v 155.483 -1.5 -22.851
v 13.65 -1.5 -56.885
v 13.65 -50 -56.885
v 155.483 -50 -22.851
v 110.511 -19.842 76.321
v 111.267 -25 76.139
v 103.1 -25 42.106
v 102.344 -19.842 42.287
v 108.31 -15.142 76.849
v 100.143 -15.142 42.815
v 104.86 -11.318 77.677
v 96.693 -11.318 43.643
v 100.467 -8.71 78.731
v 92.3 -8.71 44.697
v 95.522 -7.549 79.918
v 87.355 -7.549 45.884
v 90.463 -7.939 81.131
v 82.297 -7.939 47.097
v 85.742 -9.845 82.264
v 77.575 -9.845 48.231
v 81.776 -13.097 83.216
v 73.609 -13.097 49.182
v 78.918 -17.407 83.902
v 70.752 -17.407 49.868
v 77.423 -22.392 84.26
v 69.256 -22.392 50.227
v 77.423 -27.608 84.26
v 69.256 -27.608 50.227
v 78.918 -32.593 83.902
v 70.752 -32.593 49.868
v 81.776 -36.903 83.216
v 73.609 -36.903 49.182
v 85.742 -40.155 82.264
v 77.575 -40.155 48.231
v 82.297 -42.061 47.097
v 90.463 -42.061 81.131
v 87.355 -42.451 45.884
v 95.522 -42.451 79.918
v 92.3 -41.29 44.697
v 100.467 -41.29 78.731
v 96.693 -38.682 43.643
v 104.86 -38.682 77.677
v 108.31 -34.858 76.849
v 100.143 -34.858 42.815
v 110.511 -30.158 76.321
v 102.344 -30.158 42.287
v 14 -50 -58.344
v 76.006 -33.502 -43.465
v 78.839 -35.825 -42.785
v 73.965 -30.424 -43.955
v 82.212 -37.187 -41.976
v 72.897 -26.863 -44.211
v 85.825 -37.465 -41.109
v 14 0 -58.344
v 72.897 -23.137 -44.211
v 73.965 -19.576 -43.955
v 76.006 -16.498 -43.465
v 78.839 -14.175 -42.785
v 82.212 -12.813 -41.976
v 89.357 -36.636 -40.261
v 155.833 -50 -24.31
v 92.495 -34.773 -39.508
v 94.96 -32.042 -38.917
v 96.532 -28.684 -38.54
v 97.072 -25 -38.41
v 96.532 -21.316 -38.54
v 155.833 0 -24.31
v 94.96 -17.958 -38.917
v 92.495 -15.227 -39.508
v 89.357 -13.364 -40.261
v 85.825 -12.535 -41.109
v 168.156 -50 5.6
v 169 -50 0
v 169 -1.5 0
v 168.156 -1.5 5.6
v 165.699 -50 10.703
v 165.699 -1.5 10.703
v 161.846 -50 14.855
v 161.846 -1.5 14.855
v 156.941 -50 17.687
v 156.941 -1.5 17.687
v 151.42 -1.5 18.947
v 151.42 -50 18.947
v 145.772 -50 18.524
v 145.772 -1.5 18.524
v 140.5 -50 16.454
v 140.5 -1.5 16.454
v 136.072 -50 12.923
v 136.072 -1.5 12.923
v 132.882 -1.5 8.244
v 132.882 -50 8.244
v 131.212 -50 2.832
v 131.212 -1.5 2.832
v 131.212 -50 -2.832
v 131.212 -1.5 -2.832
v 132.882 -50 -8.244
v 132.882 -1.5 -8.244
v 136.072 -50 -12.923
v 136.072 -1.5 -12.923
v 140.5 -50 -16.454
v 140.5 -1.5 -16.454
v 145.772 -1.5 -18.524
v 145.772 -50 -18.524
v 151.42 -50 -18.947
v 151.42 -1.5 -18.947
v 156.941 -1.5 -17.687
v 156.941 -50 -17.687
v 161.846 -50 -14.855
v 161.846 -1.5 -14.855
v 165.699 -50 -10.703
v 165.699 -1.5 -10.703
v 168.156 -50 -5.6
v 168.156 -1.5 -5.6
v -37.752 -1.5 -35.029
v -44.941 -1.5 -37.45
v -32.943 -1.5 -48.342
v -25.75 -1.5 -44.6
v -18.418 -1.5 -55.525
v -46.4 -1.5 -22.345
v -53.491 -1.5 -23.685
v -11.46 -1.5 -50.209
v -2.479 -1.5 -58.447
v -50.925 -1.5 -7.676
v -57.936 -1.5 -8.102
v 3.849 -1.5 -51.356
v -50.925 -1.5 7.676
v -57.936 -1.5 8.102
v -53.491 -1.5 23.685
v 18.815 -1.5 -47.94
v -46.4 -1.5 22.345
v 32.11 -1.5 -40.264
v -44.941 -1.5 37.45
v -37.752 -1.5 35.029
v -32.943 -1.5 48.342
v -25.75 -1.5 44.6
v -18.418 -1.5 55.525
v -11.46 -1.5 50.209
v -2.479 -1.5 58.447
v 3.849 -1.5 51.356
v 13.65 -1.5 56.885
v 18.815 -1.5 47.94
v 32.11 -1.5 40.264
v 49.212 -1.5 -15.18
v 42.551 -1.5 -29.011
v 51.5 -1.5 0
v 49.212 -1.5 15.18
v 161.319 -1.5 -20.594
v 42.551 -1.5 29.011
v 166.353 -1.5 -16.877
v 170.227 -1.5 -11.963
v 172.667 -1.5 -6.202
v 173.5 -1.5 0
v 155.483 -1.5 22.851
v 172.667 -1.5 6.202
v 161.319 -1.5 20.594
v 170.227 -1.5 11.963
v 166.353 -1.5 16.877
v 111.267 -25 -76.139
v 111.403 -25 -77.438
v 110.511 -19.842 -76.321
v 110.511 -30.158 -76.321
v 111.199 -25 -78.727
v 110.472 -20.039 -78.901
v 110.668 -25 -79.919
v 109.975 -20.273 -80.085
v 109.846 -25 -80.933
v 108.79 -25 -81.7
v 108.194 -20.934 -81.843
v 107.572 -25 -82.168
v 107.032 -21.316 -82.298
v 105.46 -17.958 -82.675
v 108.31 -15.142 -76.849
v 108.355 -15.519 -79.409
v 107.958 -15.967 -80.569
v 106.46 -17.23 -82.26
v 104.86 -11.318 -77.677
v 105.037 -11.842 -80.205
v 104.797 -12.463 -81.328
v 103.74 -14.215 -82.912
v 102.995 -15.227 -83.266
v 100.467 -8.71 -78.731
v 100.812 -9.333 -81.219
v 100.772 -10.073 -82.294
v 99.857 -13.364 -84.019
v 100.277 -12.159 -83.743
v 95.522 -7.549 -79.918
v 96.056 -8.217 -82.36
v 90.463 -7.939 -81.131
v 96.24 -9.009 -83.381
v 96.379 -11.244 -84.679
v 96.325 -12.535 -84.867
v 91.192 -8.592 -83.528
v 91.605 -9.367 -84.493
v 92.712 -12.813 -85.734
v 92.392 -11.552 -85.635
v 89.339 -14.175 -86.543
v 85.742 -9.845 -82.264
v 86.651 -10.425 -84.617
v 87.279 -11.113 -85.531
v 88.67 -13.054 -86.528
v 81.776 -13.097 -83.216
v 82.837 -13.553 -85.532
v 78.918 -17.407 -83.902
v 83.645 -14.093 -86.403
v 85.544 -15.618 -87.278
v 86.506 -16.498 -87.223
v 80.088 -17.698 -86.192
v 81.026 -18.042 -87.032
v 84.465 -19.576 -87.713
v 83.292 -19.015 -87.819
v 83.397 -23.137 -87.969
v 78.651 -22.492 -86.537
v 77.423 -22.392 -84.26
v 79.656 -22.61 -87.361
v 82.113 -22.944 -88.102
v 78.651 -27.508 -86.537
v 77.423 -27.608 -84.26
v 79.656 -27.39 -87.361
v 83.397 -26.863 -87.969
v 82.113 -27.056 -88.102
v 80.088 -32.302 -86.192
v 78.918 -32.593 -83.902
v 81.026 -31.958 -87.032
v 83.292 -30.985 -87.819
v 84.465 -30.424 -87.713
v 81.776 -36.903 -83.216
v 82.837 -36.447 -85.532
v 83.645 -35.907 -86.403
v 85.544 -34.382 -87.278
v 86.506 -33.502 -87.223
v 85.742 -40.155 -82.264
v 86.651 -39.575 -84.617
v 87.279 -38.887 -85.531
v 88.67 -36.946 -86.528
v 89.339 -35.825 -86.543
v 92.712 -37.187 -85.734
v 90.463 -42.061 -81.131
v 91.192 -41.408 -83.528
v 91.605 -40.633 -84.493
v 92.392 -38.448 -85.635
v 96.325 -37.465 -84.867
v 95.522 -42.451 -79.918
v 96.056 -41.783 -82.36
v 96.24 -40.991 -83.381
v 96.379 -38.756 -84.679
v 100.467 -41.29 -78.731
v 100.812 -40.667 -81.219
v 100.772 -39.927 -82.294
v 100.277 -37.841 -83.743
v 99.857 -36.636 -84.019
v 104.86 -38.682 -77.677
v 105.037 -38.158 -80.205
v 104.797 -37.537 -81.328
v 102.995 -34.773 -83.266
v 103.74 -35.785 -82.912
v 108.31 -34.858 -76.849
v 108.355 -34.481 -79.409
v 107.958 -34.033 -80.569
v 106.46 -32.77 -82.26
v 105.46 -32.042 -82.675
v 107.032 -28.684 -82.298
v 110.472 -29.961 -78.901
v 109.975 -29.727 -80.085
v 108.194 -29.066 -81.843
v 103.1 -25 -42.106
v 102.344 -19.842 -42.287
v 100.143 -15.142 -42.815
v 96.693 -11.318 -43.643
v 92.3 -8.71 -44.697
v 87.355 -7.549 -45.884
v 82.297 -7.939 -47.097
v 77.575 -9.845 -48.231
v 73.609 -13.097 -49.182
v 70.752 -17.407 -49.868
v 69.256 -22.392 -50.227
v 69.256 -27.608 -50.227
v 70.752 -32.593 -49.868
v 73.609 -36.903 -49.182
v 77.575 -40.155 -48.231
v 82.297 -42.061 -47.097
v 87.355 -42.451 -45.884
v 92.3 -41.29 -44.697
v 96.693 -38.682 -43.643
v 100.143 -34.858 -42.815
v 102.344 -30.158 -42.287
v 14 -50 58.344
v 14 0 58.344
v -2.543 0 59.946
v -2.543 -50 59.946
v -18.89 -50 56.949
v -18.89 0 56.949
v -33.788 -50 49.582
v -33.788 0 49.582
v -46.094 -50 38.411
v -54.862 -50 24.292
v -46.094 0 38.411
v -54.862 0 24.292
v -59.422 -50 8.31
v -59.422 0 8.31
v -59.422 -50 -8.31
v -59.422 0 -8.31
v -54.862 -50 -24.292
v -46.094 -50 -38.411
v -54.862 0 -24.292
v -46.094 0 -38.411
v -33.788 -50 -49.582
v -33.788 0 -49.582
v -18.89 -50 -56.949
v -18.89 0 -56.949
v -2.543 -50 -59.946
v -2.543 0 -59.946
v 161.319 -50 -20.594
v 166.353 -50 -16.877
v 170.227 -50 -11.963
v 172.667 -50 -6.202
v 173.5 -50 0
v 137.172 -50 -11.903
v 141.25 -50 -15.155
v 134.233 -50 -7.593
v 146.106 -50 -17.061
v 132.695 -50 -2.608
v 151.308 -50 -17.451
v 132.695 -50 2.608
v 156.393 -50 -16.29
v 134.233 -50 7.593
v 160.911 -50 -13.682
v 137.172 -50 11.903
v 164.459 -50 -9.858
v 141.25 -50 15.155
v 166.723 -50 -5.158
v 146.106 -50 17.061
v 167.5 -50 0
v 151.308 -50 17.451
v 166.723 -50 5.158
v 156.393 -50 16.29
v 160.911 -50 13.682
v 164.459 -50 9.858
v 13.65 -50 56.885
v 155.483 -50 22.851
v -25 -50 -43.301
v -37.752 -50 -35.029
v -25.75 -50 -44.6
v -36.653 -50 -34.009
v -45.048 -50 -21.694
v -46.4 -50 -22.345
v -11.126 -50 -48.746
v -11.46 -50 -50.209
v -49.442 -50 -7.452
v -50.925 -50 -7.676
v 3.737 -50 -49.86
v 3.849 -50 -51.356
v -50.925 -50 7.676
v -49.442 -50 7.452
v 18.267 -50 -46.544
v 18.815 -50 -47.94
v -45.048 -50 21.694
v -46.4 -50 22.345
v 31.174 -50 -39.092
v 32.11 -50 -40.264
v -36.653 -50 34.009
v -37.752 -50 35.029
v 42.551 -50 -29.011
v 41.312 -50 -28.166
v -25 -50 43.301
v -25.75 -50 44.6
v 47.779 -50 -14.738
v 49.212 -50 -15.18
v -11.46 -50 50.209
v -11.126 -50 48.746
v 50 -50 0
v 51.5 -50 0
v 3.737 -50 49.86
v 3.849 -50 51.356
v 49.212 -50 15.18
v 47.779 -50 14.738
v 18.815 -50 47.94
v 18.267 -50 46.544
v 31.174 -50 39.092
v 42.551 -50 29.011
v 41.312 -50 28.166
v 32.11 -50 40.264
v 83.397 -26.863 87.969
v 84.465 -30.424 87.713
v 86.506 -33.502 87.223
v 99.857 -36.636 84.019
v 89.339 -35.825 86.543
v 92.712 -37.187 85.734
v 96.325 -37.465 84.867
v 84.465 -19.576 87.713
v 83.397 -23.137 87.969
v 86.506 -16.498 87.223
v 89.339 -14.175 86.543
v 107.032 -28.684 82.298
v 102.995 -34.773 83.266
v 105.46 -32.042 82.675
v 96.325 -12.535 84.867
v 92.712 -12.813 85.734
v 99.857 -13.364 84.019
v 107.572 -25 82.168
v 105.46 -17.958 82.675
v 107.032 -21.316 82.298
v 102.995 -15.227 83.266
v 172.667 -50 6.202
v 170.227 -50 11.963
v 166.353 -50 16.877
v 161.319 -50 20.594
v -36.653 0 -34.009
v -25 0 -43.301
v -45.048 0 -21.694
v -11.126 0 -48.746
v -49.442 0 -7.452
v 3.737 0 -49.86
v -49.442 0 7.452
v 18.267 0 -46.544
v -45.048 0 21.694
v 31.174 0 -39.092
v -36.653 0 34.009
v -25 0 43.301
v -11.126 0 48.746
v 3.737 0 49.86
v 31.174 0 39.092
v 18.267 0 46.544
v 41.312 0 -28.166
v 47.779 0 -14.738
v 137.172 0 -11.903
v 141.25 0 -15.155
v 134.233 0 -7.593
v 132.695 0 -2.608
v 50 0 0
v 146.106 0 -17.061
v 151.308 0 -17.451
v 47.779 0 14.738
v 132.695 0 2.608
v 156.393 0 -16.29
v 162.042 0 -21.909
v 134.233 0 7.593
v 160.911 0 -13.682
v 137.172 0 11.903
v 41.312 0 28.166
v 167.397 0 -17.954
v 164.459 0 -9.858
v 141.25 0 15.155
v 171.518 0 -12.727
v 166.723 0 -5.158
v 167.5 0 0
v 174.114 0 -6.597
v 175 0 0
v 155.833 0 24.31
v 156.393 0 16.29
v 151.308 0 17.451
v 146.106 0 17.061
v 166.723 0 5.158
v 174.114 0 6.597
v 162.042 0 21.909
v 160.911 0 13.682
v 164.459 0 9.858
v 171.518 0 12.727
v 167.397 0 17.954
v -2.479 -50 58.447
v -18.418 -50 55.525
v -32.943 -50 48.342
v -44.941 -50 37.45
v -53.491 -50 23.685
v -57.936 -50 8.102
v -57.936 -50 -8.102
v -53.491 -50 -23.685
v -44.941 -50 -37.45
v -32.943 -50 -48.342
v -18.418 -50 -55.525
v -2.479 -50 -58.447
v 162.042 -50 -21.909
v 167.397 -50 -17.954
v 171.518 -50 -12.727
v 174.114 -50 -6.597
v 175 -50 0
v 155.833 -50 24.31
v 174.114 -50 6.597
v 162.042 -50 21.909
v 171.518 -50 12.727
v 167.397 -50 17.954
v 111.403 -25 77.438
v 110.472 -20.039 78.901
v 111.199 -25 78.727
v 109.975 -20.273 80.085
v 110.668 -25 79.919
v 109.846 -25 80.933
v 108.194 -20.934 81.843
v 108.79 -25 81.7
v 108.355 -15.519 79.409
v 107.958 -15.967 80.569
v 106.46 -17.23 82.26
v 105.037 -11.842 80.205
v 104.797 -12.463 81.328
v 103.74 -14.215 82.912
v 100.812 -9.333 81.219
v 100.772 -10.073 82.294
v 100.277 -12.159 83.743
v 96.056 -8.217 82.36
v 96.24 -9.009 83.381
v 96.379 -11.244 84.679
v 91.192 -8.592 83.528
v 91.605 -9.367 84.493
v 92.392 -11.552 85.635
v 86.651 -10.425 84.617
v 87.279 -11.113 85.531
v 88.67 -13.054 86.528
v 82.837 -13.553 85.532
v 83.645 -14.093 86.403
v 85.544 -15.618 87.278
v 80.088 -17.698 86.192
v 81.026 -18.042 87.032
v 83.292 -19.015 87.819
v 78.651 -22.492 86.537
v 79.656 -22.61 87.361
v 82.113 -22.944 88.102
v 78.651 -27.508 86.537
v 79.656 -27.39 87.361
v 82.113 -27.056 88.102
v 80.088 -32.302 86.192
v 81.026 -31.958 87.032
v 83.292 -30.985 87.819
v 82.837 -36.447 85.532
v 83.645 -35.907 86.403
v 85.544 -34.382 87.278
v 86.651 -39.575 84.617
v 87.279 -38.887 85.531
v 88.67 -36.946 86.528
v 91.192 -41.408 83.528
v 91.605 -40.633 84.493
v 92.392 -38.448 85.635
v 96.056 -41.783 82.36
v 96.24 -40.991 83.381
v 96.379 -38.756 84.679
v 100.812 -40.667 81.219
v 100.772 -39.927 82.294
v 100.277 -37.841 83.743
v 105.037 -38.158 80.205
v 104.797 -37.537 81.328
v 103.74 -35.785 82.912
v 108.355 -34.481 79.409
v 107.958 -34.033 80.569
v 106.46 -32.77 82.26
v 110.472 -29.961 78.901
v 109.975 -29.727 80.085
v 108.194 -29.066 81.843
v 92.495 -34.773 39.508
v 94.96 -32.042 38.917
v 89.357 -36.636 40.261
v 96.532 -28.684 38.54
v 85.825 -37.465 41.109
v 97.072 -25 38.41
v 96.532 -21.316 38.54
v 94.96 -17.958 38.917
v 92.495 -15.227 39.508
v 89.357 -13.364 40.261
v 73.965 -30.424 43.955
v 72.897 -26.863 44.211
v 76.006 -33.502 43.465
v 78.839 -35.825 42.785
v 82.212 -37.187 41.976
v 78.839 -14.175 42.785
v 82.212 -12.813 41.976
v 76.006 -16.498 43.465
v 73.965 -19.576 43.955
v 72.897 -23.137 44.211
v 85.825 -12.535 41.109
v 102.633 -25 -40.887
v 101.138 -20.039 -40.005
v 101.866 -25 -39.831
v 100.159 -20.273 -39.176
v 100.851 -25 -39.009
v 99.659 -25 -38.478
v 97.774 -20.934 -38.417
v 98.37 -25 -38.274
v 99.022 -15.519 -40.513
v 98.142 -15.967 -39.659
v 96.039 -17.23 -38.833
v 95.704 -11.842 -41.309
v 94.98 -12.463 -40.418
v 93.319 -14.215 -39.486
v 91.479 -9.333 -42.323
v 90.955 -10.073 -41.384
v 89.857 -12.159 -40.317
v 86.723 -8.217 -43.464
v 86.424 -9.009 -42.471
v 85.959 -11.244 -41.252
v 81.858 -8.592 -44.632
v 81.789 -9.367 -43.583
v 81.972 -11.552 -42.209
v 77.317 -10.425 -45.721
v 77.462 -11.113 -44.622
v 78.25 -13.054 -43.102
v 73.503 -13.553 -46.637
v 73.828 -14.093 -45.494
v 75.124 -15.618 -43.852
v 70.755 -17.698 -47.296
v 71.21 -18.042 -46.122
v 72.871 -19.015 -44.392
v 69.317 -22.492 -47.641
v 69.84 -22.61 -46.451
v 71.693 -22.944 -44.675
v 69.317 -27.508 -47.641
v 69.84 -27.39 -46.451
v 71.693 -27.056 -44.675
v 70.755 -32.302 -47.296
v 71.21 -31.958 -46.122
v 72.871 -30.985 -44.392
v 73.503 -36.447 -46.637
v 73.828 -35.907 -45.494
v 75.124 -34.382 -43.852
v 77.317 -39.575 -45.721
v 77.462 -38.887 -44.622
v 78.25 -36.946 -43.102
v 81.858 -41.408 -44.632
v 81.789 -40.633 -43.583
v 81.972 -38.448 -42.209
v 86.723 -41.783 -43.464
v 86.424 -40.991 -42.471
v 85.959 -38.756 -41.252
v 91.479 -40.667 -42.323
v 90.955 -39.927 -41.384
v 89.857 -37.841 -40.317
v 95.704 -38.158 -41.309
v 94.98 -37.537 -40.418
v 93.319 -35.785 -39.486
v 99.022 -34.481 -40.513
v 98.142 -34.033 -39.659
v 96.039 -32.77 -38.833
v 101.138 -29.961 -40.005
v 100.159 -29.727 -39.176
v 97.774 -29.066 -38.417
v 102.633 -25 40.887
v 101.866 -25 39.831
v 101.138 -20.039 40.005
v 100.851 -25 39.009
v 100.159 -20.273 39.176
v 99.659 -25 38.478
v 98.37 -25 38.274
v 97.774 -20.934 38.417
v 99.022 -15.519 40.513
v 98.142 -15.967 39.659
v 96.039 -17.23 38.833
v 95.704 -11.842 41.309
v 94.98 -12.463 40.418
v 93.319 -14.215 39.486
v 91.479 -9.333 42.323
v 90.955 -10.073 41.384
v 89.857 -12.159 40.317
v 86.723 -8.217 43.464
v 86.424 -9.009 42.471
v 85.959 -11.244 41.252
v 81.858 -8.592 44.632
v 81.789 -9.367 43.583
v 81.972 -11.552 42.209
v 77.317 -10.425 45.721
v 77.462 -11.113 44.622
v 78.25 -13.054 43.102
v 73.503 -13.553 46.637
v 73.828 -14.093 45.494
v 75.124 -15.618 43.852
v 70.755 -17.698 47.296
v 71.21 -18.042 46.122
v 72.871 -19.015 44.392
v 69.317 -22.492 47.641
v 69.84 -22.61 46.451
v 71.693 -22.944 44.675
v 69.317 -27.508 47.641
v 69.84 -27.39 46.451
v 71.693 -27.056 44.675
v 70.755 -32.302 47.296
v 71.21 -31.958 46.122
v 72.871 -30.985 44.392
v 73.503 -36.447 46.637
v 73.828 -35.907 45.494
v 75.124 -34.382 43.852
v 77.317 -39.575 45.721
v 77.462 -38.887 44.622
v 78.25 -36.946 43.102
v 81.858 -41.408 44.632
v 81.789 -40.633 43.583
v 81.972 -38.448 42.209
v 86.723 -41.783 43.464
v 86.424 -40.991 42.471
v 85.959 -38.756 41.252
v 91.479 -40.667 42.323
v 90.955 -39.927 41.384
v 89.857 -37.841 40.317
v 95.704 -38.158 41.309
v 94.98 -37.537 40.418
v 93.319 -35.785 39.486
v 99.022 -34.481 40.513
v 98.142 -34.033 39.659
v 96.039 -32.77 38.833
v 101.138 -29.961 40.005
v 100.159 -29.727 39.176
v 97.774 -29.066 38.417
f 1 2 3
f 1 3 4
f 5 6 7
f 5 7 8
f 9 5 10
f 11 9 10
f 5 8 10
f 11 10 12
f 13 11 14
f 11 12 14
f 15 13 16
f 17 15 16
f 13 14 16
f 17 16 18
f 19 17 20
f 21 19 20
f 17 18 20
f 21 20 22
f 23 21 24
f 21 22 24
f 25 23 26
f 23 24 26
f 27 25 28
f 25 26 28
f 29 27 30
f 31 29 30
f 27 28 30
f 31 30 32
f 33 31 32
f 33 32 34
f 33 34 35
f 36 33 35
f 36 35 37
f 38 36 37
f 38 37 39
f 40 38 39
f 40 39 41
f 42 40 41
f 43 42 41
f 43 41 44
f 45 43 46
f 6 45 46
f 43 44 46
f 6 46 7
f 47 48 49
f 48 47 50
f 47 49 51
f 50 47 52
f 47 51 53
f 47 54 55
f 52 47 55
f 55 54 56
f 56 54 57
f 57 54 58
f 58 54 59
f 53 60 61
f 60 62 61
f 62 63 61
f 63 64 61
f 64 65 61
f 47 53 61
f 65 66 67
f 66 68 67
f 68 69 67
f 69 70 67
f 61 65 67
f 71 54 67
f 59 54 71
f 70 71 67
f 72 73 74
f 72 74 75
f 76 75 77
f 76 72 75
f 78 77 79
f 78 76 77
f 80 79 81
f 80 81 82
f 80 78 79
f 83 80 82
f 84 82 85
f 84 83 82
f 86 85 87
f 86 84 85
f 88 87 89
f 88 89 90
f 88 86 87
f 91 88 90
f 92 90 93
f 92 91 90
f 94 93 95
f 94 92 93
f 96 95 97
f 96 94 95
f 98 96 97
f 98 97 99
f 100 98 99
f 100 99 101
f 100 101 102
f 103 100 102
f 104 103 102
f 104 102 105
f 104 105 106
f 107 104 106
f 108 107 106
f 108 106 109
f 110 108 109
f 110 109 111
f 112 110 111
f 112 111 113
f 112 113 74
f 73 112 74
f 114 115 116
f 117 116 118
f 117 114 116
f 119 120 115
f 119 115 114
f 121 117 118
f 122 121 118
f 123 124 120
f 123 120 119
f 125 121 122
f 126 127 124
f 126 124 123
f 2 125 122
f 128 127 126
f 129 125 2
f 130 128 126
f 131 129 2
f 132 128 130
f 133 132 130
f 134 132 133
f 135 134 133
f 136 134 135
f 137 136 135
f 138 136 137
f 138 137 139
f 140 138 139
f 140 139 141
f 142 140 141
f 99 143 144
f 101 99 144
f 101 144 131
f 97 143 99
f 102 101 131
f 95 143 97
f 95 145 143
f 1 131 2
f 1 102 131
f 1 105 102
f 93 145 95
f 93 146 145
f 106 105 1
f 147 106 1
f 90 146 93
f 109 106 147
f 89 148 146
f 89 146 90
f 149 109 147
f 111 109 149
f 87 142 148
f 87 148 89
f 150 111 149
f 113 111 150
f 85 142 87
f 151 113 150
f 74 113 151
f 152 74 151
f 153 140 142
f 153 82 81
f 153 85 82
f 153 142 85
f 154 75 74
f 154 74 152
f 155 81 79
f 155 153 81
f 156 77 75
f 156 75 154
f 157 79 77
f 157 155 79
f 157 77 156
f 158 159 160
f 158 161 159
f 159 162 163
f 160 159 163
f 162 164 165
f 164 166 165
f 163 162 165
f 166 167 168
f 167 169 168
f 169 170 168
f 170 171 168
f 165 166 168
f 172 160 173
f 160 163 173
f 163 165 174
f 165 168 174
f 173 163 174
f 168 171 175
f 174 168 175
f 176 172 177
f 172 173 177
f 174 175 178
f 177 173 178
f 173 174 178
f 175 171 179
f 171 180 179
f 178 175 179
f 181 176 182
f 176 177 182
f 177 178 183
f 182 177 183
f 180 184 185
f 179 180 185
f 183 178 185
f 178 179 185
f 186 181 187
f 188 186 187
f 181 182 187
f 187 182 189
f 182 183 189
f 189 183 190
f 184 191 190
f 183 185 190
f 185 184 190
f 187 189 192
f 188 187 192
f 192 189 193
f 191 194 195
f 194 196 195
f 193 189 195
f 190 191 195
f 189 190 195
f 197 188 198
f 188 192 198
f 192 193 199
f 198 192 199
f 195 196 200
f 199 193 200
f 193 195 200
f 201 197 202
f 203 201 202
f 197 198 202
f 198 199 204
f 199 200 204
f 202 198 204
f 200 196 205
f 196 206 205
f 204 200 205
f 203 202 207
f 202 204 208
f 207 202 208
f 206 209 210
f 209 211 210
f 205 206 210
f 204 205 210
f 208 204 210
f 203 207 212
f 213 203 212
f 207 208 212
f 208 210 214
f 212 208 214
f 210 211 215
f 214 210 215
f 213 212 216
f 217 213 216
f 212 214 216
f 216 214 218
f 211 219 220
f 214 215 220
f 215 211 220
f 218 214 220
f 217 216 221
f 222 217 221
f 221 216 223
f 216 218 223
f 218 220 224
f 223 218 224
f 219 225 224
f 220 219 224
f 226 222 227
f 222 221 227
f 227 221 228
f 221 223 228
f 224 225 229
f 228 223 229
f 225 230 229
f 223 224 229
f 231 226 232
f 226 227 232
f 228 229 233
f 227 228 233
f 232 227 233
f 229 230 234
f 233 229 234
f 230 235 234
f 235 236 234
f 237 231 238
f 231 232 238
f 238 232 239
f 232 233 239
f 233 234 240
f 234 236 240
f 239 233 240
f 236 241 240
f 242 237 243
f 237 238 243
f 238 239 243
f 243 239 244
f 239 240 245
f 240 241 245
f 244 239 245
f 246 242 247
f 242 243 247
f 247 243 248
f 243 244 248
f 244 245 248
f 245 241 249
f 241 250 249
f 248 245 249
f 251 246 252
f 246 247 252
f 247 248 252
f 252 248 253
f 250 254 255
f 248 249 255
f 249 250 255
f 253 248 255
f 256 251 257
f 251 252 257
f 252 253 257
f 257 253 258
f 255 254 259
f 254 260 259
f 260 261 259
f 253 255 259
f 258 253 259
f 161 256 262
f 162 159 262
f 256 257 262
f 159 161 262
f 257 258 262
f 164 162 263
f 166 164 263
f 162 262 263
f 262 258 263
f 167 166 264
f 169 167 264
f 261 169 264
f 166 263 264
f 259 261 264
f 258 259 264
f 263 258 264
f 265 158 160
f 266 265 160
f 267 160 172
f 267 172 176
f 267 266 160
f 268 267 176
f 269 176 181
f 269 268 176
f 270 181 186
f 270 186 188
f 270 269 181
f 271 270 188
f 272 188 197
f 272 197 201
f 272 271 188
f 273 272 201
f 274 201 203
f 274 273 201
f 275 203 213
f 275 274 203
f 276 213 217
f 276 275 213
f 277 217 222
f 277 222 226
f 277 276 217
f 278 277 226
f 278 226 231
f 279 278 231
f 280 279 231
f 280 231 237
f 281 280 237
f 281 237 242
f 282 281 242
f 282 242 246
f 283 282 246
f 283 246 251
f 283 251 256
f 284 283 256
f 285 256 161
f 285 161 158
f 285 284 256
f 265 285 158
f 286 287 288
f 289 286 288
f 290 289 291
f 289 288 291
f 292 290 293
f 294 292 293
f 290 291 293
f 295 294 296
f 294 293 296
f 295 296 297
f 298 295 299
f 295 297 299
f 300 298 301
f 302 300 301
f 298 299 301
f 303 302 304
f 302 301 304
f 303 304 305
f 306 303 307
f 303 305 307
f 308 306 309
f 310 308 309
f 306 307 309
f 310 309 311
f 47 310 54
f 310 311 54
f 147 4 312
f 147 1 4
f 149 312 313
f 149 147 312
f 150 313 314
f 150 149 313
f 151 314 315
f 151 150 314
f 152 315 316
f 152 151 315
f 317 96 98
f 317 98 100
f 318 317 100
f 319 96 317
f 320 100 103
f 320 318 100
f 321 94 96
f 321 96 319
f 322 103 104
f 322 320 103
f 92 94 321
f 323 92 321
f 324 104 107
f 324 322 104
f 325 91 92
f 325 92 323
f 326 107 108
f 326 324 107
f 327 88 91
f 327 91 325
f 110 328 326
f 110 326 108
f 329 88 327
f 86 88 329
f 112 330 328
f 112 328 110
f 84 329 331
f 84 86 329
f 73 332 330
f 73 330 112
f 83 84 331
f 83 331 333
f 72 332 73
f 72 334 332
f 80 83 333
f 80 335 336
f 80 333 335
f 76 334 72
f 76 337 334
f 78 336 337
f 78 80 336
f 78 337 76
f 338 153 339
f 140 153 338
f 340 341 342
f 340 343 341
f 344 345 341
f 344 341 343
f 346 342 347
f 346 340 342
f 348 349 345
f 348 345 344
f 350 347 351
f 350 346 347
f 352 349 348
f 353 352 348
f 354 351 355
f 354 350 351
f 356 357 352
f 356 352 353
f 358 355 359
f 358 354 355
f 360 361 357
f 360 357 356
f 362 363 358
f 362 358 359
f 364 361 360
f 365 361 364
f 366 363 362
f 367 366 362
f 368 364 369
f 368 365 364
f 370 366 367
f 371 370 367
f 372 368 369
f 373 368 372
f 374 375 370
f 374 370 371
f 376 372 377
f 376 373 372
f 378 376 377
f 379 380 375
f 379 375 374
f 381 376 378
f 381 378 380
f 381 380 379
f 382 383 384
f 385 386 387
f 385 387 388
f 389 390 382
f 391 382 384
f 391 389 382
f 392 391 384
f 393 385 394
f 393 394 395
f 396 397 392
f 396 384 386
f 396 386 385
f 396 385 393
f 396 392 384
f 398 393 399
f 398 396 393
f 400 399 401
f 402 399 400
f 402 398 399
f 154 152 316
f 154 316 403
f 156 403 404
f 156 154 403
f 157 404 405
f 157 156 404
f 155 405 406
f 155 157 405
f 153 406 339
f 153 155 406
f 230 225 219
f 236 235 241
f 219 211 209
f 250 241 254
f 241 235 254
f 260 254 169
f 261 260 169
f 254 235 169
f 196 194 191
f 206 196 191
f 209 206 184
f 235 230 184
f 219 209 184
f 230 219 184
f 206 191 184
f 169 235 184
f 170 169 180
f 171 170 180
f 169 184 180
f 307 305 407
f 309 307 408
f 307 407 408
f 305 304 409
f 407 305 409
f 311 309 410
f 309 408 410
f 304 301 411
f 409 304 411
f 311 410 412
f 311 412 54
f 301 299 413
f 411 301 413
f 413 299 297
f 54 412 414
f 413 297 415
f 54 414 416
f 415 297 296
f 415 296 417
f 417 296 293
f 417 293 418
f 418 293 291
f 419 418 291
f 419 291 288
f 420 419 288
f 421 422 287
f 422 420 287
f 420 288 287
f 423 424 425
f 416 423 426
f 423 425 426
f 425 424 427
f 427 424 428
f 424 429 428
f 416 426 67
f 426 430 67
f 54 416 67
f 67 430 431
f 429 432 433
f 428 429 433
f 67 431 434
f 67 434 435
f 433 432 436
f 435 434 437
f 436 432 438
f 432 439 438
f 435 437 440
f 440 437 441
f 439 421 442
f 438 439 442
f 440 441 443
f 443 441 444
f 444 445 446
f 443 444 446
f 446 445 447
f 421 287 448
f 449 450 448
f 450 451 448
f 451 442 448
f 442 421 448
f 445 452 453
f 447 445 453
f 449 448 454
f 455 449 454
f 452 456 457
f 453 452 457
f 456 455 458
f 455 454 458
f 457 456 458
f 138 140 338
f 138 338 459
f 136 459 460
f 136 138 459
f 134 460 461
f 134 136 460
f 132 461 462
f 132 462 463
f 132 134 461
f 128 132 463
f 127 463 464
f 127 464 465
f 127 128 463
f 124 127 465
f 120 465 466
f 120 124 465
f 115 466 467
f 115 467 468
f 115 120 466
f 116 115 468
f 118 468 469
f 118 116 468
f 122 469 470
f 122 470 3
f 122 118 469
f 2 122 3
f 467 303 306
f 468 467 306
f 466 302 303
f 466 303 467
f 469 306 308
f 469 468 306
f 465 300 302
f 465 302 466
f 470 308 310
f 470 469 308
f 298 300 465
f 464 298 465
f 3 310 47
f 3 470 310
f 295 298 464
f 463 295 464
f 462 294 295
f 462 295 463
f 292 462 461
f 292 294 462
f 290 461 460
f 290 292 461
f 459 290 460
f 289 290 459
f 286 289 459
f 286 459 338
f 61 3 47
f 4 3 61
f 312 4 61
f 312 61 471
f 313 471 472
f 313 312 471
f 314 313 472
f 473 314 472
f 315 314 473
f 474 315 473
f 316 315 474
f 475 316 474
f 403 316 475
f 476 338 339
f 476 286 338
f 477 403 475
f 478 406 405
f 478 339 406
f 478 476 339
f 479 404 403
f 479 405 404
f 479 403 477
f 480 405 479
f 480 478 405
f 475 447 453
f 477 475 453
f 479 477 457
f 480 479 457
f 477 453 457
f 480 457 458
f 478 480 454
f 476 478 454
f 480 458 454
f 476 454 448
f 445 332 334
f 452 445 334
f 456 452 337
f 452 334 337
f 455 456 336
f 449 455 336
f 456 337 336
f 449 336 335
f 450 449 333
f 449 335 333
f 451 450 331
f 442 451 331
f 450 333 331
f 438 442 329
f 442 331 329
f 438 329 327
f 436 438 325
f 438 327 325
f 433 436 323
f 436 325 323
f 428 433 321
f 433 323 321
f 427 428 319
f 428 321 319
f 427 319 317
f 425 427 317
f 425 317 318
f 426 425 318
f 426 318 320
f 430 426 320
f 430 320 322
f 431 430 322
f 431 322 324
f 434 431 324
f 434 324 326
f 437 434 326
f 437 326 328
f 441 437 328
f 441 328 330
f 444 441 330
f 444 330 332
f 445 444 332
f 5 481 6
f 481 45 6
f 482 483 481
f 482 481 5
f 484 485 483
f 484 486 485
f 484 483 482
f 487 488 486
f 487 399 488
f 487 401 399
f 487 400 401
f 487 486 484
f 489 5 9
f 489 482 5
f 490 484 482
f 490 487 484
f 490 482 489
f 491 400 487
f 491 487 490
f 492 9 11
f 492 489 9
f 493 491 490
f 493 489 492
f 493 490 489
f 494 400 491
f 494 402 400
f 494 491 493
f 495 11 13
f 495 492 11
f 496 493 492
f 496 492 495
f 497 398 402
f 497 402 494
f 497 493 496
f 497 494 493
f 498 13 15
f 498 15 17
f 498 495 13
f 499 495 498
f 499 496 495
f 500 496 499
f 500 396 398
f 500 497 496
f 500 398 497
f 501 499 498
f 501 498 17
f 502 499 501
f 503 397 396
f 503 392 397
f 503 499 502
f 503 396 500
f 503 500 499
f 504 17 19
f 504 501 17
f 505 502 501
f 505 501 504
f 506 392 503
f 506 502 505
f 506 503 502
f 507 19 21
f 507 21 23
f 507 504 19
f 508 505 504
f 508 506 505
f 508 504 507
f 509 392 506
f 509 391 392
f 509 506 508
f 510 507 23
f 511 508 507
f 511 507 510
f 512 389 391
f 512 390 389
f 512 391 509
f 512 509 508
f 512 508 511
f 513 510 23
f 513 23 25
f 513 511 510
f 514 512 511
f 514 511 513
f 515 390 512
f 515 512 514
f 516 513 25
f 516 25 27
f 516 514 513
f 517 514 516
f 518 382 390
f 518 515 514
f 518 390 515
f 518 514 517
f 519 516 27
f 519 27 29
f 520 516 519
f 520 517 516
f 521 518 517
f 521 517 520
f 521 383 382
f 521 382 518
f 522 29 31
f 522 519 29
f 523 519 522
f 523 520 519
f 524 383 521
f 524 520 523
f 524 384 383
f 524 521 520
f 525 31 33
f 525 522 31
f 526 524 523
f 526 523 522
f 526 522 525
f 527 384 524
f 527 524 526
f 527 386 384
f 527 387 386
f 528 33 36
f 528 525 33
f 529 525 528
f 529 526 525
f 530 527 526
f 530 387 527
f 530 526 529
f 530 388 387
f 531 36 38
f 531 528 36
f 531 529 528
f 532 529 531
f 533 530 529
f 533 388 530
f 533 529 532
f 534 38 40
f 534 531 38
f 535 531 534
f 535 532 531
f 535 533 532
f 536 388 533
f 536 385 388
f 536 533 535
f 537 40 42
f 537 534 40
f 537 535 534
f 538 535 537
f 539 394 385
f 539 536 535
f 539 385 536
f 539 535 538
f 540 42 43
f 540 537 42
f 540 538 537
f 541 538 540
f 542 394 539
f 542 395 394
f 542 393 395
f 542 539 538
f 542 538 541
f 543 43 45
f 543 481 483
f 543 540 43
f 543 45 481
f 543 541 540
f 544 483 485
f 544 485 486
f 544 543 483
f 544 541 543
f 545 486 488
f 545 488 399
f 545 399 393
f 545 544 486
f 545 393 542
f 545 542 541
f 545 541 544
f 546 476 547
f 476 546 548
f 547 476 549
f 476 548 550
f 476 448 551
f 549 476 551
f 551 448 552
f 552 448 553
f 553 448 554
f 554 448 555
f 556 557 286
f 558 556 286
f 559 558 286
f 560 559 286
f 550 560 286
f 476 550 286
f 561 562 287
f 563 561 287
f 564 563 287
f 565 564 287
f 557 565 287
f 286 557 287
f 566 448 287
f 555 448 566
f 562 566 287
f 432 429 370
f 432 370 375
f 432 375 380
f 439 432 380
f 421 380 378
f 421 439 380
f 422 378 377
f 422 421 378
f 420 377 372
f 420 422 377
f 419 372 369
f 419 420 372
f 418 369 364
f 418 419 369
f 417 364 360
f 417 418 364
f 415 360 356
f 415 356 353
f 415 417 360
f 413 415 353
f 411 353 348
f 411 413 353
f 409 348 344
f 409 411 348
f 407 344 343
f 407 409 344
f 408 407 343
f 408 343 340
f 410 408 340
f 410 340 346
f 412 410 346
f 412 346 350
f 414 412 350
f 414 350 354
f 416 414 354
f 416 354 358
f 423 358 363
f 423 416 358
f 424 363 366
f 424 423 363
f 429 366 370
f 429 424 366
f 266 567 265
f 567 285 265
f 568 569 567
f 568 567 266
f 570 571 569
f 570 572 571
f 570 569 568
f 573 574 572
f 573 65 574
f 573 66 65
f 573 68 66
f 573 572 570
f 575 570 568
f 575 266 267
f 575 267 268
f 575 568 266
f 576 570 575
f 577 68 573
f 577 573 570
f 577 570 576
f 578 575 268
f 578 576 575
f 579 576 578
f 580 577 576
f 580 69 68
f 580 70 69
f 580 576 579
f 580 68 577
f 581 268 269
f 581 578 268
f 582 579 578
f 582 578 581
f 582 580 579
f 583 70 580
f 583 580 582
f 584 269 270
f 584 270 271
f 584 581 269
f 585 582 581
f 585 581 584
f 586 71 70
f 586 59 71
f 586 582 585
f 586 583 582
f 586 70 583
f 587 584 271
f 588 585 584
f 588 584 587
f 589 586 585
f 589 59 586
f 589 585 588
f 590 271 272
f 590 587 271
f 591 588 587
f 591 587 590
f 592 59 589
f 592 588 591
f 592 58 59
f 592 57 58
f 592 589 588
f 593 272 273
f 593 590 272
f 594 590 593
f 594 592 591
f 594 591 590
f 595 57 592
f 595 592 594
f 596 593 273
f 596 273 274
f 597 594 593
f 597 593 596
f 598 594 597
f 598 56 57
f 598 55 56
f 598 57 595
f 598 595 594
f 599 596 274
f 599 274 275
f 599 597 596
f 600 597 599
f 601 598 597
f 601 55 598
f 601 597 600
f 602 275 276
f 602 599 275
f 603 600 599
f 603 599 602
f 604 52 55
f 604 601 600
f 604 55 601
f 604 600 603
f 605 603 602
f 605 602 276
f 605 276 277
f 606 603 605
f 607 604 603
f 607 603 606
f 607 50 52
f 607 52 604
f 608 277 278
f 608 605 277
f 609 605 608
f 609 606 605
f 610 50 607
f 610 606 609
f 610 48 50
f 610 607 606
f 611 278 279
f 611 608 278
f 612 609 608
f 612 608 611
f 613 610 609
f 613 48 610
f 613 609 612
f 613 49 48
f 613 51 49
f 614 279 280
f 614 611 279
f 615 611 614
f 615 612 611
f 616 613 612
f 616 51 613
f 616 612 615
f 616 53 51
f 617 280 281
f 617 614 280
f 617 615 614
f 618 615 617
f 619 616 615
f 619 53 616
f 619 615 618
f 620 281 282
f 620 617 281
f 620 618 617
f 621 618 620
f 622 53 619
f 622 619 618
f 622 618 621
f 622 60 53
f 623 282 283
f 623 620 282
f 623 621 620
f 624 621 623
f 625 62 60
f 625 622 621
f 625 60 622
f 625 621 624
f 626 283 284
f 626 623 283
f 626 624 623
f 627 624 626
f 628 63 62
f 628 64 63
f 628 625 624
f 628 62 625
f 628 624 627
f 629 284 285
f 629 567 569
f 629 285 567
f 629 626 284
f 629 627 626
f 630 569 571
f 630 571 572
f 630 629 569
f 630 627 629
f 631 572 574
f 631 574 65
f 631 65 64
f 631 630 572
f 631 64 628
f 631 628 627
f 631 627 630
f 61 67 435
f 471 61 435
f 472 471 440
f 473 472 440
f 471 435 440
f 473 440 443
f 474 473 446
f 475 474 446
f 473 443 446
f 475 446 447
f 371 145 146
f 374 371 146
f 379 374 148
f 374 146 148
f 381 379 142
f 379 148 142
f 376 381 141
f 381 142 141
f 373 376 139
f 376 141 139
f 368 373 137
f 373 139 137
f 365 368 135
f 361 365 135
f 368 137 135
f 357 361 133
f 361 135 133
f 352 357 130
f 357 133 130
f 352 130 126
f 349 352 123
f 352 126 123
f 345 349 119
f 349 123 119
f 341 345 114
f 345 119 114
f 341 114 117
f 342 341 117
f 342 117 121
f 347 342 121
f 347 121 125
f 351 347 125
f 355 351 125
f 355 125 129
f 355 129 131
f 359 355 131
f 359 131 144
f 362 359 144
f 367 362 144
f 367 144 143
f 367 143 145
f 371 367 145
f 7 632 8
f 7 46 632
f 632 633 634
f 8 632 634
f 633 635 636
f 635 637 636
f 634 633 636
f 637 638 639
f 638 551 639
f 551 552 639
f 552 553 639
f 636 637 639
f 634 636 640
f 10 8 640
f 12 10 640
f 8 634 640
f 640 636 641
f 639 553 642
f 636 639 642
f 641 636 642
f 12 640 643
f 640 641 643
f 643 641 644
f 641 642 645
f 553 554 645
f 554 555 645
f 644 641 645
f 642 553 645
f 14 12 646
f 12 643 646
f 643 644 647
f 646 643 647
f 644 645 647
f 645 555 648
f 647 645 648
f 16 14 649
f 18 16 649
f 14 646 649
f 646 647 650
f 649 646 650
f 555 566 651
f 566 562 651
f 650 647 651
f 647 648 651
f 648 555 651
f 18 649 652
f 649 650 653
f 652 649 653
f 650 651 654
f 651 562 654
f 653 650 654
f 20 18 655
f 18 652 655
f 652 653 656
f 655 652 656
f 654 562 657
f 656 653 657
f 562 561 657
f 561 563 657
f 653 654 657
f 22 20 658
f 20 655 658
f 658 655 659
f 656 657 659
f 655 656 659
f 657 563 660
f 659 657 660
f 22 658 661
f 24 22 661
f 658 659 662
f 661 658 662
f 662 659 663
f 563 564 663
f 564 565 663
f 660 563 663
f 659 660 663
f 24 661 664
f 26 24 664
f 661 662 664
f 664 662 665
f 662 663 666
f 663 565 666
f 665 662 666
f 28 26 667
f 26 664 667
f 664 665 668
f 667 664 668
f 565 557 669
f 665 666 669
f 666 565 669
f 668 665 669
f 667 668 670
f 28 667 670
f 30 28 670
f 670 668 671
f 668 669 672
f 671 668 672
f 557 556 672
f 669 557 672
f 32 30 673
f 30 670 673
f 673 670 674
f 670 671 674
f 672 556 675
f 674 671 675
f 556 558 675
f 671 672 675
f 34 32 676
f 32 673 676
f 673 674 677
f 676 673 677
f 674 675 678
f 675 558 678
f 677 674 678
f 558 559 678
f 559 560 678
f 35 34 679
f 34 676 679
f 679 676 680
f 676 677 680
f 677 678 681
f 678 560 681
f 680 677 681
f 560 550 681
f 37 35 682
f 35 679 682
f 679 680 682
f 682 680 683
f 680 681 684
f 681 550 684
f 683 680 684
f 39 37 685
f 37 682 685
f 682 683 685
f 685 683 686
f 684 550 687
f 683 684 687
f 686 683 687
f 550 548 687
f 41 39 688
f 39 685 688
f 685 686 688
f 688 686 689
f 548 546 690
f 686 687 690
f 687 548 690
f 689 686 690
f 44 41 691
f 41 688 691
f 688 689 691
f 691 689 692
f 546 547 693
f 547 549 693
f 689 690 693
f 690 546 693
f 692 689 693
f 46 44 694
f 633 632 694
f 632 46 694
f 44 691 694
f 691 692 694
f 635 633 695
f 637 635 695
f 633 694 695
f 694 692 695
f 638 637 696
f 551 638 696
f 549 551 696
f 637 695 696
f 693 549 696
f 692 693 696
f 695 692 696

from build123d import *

# Parameters (mm, degrees)
F0_R     = 50
F1_DEPTH = 50
F2_R     = 17.5
F3_DEPTH = 45
F4_R     = 5
F5_R     = 17.5
F6_DEPTH = 50.001
F7_T     = -1.5


with BuildPart() as f1:
    # F0 (on Front) → F1 (new body)
    with BuildSketch(Plane.XZ):
        with BuildLine():
            ThreePointArc((14, -58.3438085833), (47.1168759576, -37.148351242), (60, 0))
            ThreePointArc((60, 0), (47.1168759576, 37.148351242), (14, 58.3438085833))
            ThreePointArc((14, 58.3438085833), (-60, 0), (14, -58.3438085833))
        make_face()
        Circle(F0_R, mode=Mode.SUBTRACT)
        with BuildLine():
            ThreePointArc((14, 58.3438085833), (47.1168759576, 37.148351242), (60, 0))
            ThreePointArc((60, 0), (47.1168759576, -37.148351242), (14, -58.3438085833))
            Line((14, -58.3438085833), (155.8333333333, -24.309920243))
            ThreePointArc((155.8333333333, -24.309920243), (125, 0), (155.8333333333, 24.309920243))
            Line((155.8333333333, 24.309920243), (14, 58.3438085833))
        make_face()
        with BuildLine():
            ThreePointArc((175, 0), (169.632031649, 15.4784796842), (155.8333333333, 24.309920243))
            ThreePointArc((155.8333333333, 24.309920243), (125, 0), (155.8333333333, -24.309920243))
            ThreePointArc((155.8333333333, -24.309920243), (169.632031649, -15.4784796842), (175, 0))
        make_face()
    extrude(amount=F1_DEPTH)

    # F5 (on face) → F6 (cut, through all)
    with BuildSketch(Plane.XZ.offset(50)):
        with Locations((150, 0)):
            Circle(F5_R)
    extrude(amount=-F6_DEPTH, mode=Mode.SUBTRACT)

    # F7
    f7_openings = [f1.faces().sort_by_distance(p)[0] for p in [
        (65.769085, -50, 0),
    ]]
    offset(amount=F7_T, openings=f7_openings)



with BuildPart() as f3:
    # F2 (on face) → F3 (new body)
    with BuildSketch(Plane(origin=(14, 0, 58.3438085833), x_dir=(0.9723968097, 0, -0.2333333333), z_dir=(0.2333333333, 0, 0.9723968097))):
        with Locations((72.9297607291, -25)):
            Circle(F2_R)
    extrude(amount=F3_DEPTH)

    # F4
    f4_edges = [f3.edges().sort_by_distance(p)[0] for p in [
        (78.399722, -25, 89.168054),
        (67.899722, -25, 45.410198),
    ]]
    fillet(f4_edges, radius=F4_R)


with BuildPart() as f1_1:
    add(f1.part)

    add(f3.part)  # F8 merges F3
    # F8: F3 across plane
    add(f3.part.mirror(Plane.XY))


solid = f1_1.part
